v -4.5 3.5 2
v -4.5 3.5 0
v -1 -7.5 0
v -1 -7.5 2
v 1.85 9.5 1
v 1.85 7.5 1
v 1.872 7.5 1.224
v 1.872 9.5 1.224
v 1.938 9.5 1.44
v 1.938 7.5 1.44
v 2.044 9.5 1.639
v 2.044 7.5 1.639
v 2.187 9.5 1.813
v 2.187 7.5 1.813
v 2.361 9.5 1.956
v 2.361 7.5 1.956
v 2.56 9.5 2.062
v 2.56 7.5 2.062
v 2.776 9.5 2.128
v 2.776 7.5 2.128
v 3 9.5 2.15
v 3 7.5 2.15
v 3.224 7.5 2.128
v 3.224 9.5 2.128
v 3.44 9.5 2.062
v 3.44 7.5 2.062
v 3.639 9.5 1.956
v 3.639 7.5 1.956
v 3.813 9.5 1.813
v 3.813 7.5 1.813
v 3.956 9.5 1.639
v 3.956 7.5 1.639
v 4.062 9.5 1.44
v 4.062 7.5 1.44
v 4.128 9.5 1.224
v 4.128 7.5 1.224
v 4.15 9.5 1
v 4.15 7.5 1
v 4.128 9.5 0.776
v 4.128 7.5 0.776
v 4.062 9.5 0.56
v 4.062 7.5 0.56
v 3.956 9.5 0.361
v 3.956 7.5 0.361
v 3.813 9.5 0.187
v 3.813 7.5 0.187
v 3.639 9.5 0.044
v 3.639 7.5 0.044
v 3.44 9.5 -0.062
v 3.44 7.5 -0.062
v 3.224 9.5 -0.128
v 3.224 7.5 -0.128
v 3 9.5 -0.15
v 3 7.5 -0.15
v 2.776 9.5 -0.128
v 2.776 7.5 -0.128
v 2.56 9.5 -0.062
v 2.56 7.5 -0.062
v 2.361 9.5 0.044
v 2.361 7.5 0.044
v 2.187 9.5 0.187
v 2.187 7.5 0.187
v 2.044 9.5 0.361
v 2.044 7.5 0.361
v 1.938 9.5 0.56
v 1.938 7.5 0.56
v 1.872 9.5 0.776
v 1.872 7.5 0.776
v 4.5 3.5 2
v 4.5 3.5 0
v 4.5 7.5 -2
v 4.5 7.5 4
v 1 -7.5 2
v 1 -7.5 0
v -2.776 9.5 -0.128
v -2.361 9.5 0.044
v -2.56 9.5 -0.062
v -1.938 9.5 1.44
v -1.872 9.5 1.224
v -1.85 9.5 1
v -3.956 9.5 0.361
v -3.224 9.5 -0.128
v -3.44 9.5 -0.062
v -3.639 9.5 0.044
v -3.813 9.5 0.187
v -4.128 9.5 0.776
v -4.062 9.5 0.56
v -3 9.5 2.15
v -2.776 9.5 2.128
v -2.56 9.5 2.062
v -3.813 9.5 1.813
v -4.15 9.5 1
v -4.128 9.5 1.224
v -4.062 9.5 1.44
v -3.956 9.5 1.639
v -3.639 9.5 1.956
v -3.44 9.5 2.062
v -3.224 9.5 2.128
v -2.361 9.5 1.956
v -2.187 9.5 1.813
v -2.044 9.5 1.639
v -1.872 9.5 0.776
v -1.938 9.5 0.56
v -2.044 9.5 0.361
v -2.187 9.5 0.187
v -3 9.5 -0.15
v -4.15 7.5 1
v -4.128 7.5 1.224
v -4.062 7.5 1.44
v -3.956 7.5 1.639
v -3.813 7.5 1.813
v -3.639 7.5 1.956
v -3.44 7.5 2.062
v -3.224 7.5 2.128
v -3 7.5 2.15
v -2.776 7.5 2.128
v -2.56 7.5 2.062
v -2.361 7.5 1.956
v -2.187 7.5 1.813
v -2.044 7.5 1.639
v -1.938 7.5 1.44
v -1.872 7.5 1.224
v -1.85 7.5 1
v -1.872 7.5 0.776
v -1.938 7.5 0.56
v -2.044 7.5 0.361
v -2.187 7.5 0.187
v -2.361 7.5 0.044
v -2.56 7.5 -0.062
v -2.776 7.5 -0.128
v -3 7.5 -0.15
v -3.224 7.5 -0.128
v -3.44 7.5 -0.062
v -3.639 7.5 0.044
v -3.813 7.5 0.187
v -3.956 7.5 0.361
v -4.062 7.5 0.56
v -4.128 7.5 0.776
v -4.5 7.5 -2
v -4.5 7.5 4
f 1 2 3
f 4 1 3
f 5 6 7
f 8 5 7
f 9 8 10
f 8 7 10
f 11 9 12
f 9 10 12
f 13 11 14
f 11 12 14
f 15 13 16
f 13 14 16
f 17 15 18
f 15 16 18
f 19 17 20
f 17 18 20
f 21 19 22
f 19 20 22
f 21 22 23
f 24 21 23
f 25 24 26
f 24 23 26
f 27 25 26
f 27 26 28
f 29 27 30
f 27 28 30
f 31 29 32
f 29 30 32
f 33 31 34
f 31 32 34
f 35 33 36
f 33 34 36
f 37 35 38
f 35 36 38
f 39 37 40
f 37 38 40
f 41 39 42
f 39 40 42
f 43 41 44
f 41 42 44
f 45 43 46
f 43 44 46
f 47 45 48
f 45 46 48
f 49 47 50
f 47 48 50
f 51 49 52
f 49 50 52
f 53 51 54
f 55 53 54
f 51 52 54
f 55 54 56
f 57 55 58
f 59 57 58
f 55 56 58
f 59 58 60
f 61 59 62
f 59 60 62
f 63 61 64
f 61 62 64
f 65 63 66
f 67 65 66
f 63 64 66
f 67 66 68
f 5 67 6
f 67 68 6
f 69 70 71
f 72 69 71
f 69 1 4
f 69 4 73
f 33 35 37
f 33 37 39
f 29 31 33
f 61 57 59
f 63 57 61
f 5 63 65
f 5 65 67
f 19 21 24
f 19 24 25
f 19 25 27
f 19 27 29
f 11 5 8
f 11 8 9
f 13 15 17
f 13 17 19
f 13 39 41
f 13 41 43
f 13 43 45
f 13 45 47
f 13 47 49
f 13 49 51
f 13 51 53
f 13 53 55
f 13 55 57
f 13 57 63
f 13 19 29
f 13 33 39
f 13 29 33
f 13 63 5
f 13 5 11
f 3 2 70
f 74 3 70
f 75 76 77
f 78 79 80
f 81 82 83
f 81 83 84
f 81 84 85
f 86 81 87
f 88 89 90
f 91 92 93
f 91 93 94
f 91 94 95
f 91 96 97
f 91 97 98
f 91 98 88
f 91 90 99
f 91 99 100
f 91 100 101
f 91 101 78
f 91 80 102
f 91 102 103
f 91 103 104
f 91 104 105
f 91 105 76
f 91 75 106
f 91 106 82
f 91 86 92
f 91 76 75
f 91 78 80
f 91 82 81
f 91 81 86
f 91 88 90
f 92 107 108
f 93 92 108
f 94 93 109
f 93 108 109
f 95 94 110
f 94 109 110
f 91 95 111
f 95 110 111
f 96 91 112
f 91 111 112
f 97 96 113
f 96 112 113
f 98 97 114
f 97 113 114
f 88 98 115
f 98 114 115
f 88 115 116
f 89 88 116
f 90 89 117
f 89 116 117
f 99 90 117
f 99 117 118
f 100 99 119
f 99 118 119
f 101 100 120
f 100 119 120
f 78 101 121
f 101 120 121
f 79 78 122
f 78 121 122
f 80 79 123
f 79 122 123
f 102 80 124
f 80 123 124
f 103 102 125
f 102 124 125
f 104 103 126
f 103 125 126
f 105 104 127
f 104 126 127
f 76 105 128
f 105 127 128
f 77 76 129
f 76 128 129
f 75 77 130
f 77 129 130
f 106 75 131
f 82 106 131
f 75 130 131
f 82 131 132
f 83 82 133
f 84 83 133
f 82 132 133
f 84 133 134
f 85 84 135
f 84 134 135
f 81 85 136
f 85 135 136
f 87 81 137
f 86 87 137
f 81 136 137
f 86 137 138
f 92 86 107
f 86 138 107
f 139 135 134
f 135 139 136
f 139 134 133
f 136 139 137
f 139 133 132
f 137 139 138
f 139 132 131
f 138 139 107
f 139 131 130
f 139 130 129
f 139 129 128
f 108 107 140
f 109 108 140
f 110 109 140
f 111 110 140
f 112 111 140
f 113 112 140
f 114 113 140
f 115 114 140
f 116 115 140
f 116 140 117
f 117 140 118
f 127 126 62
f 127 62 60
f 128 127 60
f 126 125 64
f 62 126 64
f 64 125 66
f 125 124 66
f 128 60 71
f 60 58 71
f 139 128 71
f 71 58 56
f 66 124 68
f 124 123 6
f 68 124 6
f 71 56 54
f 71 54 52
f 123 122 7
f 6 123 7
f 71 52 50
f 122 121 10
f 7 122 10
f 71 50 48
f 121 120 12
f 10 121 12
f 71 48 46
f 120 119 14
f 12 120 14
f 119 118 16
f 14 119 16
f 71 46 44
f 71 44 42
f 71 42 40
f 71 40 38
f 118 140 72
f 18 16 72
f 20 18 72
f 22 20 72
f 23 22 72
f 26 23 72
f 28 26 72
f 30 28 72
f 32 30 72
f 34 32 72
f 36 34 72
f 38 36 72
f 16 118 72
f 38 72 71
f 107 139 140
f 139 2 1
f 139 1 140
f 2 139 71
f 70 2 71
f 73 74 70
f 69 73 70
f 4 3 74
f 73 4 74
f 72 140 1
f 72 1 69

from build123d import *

# Parameters (mm, degrees)
F0_W          = 9
F0_H          = 4
F1_DEPTH      = 2
F2_DEPTH      = 4
F2_DEPTH_BACK = 2
F3_SIZE2      = 3.99999
F3_SIZE       = 1.99999
F4_SIZE2      = 3.99999
F4_SIZE       = 1.99999
F5_R          = 1.15
F6_DEPTH      = 2


# Not quite as in the source:
# - a fillet or chamfer is up to 0.001 mm smaller than in the source, because OpenCascade refuses the exact size


with BuildPart() as f1:
    # F0 (on Top) → F1 (new body)
    with BuildSketch(Plane.XY):
        with Locations((0, 5.5)):
            Rectangle(F0_W, F0_H)
        Polygon((1, -7.5), (4.5, 3.5), (-4.5, 3.5), (-1, -7.5), align=None)
    extrude(amount=F1_DEPTH)

    # F0 (on Top) → F2 (join, two sides)
    with BuildSketch(Plane.XY) as f2_sk:
        with Locations((0, 5.5)):
            Rectangle(F0_W, F0_H)
    extrude(amount=F2_DEPTH)
    extrude(f2_sk.sketch, amount=-F2_DEPTH_BACK)

    # F3 (size 2 and 4 in the source; OpenCascade refuses exactly that, so slightly less here)
    f3_edges = [f1.edges().sort_by_distance(p)[0] for p in [
        (0, 3.5, -2),
    ]]
    f3_side = f1.faces().sort_by_distance((0, 3.5, -1))[0]
    chamfer(f3_edges, length=F3_SIZE, length2=F3_SIZE2, reference=f3_side)

    # F4 (size 2 and 4 in the source; OpenCascade refuses exactly that, so slightly less here)
    f4_edges = [f1.edges().sort_by_distance(p)[0] for p in [
        (0, 3.5, 4),
    ]]
    f4_side = f1.faces().sort_by_distance((0, 3.5, 3))[0]
    chamfer(f4_edges, length=F4_SIZE, length2=F4_SIZE2, reference=f4_side)

    # F5 (on face) → F6 (join)
    with BuildSketch(Plane(origin=(0, 7.5, 0), x_dir=(-1, 0, 0), z_dir=(0, 1, 0))):
        with Locations((-3, 1)):
            Circle(F5_R)
        with Locations((3, 1)):
            Circle(F5_R)
    extrude(amount=F6_DEPTH)


solid = f1.part
